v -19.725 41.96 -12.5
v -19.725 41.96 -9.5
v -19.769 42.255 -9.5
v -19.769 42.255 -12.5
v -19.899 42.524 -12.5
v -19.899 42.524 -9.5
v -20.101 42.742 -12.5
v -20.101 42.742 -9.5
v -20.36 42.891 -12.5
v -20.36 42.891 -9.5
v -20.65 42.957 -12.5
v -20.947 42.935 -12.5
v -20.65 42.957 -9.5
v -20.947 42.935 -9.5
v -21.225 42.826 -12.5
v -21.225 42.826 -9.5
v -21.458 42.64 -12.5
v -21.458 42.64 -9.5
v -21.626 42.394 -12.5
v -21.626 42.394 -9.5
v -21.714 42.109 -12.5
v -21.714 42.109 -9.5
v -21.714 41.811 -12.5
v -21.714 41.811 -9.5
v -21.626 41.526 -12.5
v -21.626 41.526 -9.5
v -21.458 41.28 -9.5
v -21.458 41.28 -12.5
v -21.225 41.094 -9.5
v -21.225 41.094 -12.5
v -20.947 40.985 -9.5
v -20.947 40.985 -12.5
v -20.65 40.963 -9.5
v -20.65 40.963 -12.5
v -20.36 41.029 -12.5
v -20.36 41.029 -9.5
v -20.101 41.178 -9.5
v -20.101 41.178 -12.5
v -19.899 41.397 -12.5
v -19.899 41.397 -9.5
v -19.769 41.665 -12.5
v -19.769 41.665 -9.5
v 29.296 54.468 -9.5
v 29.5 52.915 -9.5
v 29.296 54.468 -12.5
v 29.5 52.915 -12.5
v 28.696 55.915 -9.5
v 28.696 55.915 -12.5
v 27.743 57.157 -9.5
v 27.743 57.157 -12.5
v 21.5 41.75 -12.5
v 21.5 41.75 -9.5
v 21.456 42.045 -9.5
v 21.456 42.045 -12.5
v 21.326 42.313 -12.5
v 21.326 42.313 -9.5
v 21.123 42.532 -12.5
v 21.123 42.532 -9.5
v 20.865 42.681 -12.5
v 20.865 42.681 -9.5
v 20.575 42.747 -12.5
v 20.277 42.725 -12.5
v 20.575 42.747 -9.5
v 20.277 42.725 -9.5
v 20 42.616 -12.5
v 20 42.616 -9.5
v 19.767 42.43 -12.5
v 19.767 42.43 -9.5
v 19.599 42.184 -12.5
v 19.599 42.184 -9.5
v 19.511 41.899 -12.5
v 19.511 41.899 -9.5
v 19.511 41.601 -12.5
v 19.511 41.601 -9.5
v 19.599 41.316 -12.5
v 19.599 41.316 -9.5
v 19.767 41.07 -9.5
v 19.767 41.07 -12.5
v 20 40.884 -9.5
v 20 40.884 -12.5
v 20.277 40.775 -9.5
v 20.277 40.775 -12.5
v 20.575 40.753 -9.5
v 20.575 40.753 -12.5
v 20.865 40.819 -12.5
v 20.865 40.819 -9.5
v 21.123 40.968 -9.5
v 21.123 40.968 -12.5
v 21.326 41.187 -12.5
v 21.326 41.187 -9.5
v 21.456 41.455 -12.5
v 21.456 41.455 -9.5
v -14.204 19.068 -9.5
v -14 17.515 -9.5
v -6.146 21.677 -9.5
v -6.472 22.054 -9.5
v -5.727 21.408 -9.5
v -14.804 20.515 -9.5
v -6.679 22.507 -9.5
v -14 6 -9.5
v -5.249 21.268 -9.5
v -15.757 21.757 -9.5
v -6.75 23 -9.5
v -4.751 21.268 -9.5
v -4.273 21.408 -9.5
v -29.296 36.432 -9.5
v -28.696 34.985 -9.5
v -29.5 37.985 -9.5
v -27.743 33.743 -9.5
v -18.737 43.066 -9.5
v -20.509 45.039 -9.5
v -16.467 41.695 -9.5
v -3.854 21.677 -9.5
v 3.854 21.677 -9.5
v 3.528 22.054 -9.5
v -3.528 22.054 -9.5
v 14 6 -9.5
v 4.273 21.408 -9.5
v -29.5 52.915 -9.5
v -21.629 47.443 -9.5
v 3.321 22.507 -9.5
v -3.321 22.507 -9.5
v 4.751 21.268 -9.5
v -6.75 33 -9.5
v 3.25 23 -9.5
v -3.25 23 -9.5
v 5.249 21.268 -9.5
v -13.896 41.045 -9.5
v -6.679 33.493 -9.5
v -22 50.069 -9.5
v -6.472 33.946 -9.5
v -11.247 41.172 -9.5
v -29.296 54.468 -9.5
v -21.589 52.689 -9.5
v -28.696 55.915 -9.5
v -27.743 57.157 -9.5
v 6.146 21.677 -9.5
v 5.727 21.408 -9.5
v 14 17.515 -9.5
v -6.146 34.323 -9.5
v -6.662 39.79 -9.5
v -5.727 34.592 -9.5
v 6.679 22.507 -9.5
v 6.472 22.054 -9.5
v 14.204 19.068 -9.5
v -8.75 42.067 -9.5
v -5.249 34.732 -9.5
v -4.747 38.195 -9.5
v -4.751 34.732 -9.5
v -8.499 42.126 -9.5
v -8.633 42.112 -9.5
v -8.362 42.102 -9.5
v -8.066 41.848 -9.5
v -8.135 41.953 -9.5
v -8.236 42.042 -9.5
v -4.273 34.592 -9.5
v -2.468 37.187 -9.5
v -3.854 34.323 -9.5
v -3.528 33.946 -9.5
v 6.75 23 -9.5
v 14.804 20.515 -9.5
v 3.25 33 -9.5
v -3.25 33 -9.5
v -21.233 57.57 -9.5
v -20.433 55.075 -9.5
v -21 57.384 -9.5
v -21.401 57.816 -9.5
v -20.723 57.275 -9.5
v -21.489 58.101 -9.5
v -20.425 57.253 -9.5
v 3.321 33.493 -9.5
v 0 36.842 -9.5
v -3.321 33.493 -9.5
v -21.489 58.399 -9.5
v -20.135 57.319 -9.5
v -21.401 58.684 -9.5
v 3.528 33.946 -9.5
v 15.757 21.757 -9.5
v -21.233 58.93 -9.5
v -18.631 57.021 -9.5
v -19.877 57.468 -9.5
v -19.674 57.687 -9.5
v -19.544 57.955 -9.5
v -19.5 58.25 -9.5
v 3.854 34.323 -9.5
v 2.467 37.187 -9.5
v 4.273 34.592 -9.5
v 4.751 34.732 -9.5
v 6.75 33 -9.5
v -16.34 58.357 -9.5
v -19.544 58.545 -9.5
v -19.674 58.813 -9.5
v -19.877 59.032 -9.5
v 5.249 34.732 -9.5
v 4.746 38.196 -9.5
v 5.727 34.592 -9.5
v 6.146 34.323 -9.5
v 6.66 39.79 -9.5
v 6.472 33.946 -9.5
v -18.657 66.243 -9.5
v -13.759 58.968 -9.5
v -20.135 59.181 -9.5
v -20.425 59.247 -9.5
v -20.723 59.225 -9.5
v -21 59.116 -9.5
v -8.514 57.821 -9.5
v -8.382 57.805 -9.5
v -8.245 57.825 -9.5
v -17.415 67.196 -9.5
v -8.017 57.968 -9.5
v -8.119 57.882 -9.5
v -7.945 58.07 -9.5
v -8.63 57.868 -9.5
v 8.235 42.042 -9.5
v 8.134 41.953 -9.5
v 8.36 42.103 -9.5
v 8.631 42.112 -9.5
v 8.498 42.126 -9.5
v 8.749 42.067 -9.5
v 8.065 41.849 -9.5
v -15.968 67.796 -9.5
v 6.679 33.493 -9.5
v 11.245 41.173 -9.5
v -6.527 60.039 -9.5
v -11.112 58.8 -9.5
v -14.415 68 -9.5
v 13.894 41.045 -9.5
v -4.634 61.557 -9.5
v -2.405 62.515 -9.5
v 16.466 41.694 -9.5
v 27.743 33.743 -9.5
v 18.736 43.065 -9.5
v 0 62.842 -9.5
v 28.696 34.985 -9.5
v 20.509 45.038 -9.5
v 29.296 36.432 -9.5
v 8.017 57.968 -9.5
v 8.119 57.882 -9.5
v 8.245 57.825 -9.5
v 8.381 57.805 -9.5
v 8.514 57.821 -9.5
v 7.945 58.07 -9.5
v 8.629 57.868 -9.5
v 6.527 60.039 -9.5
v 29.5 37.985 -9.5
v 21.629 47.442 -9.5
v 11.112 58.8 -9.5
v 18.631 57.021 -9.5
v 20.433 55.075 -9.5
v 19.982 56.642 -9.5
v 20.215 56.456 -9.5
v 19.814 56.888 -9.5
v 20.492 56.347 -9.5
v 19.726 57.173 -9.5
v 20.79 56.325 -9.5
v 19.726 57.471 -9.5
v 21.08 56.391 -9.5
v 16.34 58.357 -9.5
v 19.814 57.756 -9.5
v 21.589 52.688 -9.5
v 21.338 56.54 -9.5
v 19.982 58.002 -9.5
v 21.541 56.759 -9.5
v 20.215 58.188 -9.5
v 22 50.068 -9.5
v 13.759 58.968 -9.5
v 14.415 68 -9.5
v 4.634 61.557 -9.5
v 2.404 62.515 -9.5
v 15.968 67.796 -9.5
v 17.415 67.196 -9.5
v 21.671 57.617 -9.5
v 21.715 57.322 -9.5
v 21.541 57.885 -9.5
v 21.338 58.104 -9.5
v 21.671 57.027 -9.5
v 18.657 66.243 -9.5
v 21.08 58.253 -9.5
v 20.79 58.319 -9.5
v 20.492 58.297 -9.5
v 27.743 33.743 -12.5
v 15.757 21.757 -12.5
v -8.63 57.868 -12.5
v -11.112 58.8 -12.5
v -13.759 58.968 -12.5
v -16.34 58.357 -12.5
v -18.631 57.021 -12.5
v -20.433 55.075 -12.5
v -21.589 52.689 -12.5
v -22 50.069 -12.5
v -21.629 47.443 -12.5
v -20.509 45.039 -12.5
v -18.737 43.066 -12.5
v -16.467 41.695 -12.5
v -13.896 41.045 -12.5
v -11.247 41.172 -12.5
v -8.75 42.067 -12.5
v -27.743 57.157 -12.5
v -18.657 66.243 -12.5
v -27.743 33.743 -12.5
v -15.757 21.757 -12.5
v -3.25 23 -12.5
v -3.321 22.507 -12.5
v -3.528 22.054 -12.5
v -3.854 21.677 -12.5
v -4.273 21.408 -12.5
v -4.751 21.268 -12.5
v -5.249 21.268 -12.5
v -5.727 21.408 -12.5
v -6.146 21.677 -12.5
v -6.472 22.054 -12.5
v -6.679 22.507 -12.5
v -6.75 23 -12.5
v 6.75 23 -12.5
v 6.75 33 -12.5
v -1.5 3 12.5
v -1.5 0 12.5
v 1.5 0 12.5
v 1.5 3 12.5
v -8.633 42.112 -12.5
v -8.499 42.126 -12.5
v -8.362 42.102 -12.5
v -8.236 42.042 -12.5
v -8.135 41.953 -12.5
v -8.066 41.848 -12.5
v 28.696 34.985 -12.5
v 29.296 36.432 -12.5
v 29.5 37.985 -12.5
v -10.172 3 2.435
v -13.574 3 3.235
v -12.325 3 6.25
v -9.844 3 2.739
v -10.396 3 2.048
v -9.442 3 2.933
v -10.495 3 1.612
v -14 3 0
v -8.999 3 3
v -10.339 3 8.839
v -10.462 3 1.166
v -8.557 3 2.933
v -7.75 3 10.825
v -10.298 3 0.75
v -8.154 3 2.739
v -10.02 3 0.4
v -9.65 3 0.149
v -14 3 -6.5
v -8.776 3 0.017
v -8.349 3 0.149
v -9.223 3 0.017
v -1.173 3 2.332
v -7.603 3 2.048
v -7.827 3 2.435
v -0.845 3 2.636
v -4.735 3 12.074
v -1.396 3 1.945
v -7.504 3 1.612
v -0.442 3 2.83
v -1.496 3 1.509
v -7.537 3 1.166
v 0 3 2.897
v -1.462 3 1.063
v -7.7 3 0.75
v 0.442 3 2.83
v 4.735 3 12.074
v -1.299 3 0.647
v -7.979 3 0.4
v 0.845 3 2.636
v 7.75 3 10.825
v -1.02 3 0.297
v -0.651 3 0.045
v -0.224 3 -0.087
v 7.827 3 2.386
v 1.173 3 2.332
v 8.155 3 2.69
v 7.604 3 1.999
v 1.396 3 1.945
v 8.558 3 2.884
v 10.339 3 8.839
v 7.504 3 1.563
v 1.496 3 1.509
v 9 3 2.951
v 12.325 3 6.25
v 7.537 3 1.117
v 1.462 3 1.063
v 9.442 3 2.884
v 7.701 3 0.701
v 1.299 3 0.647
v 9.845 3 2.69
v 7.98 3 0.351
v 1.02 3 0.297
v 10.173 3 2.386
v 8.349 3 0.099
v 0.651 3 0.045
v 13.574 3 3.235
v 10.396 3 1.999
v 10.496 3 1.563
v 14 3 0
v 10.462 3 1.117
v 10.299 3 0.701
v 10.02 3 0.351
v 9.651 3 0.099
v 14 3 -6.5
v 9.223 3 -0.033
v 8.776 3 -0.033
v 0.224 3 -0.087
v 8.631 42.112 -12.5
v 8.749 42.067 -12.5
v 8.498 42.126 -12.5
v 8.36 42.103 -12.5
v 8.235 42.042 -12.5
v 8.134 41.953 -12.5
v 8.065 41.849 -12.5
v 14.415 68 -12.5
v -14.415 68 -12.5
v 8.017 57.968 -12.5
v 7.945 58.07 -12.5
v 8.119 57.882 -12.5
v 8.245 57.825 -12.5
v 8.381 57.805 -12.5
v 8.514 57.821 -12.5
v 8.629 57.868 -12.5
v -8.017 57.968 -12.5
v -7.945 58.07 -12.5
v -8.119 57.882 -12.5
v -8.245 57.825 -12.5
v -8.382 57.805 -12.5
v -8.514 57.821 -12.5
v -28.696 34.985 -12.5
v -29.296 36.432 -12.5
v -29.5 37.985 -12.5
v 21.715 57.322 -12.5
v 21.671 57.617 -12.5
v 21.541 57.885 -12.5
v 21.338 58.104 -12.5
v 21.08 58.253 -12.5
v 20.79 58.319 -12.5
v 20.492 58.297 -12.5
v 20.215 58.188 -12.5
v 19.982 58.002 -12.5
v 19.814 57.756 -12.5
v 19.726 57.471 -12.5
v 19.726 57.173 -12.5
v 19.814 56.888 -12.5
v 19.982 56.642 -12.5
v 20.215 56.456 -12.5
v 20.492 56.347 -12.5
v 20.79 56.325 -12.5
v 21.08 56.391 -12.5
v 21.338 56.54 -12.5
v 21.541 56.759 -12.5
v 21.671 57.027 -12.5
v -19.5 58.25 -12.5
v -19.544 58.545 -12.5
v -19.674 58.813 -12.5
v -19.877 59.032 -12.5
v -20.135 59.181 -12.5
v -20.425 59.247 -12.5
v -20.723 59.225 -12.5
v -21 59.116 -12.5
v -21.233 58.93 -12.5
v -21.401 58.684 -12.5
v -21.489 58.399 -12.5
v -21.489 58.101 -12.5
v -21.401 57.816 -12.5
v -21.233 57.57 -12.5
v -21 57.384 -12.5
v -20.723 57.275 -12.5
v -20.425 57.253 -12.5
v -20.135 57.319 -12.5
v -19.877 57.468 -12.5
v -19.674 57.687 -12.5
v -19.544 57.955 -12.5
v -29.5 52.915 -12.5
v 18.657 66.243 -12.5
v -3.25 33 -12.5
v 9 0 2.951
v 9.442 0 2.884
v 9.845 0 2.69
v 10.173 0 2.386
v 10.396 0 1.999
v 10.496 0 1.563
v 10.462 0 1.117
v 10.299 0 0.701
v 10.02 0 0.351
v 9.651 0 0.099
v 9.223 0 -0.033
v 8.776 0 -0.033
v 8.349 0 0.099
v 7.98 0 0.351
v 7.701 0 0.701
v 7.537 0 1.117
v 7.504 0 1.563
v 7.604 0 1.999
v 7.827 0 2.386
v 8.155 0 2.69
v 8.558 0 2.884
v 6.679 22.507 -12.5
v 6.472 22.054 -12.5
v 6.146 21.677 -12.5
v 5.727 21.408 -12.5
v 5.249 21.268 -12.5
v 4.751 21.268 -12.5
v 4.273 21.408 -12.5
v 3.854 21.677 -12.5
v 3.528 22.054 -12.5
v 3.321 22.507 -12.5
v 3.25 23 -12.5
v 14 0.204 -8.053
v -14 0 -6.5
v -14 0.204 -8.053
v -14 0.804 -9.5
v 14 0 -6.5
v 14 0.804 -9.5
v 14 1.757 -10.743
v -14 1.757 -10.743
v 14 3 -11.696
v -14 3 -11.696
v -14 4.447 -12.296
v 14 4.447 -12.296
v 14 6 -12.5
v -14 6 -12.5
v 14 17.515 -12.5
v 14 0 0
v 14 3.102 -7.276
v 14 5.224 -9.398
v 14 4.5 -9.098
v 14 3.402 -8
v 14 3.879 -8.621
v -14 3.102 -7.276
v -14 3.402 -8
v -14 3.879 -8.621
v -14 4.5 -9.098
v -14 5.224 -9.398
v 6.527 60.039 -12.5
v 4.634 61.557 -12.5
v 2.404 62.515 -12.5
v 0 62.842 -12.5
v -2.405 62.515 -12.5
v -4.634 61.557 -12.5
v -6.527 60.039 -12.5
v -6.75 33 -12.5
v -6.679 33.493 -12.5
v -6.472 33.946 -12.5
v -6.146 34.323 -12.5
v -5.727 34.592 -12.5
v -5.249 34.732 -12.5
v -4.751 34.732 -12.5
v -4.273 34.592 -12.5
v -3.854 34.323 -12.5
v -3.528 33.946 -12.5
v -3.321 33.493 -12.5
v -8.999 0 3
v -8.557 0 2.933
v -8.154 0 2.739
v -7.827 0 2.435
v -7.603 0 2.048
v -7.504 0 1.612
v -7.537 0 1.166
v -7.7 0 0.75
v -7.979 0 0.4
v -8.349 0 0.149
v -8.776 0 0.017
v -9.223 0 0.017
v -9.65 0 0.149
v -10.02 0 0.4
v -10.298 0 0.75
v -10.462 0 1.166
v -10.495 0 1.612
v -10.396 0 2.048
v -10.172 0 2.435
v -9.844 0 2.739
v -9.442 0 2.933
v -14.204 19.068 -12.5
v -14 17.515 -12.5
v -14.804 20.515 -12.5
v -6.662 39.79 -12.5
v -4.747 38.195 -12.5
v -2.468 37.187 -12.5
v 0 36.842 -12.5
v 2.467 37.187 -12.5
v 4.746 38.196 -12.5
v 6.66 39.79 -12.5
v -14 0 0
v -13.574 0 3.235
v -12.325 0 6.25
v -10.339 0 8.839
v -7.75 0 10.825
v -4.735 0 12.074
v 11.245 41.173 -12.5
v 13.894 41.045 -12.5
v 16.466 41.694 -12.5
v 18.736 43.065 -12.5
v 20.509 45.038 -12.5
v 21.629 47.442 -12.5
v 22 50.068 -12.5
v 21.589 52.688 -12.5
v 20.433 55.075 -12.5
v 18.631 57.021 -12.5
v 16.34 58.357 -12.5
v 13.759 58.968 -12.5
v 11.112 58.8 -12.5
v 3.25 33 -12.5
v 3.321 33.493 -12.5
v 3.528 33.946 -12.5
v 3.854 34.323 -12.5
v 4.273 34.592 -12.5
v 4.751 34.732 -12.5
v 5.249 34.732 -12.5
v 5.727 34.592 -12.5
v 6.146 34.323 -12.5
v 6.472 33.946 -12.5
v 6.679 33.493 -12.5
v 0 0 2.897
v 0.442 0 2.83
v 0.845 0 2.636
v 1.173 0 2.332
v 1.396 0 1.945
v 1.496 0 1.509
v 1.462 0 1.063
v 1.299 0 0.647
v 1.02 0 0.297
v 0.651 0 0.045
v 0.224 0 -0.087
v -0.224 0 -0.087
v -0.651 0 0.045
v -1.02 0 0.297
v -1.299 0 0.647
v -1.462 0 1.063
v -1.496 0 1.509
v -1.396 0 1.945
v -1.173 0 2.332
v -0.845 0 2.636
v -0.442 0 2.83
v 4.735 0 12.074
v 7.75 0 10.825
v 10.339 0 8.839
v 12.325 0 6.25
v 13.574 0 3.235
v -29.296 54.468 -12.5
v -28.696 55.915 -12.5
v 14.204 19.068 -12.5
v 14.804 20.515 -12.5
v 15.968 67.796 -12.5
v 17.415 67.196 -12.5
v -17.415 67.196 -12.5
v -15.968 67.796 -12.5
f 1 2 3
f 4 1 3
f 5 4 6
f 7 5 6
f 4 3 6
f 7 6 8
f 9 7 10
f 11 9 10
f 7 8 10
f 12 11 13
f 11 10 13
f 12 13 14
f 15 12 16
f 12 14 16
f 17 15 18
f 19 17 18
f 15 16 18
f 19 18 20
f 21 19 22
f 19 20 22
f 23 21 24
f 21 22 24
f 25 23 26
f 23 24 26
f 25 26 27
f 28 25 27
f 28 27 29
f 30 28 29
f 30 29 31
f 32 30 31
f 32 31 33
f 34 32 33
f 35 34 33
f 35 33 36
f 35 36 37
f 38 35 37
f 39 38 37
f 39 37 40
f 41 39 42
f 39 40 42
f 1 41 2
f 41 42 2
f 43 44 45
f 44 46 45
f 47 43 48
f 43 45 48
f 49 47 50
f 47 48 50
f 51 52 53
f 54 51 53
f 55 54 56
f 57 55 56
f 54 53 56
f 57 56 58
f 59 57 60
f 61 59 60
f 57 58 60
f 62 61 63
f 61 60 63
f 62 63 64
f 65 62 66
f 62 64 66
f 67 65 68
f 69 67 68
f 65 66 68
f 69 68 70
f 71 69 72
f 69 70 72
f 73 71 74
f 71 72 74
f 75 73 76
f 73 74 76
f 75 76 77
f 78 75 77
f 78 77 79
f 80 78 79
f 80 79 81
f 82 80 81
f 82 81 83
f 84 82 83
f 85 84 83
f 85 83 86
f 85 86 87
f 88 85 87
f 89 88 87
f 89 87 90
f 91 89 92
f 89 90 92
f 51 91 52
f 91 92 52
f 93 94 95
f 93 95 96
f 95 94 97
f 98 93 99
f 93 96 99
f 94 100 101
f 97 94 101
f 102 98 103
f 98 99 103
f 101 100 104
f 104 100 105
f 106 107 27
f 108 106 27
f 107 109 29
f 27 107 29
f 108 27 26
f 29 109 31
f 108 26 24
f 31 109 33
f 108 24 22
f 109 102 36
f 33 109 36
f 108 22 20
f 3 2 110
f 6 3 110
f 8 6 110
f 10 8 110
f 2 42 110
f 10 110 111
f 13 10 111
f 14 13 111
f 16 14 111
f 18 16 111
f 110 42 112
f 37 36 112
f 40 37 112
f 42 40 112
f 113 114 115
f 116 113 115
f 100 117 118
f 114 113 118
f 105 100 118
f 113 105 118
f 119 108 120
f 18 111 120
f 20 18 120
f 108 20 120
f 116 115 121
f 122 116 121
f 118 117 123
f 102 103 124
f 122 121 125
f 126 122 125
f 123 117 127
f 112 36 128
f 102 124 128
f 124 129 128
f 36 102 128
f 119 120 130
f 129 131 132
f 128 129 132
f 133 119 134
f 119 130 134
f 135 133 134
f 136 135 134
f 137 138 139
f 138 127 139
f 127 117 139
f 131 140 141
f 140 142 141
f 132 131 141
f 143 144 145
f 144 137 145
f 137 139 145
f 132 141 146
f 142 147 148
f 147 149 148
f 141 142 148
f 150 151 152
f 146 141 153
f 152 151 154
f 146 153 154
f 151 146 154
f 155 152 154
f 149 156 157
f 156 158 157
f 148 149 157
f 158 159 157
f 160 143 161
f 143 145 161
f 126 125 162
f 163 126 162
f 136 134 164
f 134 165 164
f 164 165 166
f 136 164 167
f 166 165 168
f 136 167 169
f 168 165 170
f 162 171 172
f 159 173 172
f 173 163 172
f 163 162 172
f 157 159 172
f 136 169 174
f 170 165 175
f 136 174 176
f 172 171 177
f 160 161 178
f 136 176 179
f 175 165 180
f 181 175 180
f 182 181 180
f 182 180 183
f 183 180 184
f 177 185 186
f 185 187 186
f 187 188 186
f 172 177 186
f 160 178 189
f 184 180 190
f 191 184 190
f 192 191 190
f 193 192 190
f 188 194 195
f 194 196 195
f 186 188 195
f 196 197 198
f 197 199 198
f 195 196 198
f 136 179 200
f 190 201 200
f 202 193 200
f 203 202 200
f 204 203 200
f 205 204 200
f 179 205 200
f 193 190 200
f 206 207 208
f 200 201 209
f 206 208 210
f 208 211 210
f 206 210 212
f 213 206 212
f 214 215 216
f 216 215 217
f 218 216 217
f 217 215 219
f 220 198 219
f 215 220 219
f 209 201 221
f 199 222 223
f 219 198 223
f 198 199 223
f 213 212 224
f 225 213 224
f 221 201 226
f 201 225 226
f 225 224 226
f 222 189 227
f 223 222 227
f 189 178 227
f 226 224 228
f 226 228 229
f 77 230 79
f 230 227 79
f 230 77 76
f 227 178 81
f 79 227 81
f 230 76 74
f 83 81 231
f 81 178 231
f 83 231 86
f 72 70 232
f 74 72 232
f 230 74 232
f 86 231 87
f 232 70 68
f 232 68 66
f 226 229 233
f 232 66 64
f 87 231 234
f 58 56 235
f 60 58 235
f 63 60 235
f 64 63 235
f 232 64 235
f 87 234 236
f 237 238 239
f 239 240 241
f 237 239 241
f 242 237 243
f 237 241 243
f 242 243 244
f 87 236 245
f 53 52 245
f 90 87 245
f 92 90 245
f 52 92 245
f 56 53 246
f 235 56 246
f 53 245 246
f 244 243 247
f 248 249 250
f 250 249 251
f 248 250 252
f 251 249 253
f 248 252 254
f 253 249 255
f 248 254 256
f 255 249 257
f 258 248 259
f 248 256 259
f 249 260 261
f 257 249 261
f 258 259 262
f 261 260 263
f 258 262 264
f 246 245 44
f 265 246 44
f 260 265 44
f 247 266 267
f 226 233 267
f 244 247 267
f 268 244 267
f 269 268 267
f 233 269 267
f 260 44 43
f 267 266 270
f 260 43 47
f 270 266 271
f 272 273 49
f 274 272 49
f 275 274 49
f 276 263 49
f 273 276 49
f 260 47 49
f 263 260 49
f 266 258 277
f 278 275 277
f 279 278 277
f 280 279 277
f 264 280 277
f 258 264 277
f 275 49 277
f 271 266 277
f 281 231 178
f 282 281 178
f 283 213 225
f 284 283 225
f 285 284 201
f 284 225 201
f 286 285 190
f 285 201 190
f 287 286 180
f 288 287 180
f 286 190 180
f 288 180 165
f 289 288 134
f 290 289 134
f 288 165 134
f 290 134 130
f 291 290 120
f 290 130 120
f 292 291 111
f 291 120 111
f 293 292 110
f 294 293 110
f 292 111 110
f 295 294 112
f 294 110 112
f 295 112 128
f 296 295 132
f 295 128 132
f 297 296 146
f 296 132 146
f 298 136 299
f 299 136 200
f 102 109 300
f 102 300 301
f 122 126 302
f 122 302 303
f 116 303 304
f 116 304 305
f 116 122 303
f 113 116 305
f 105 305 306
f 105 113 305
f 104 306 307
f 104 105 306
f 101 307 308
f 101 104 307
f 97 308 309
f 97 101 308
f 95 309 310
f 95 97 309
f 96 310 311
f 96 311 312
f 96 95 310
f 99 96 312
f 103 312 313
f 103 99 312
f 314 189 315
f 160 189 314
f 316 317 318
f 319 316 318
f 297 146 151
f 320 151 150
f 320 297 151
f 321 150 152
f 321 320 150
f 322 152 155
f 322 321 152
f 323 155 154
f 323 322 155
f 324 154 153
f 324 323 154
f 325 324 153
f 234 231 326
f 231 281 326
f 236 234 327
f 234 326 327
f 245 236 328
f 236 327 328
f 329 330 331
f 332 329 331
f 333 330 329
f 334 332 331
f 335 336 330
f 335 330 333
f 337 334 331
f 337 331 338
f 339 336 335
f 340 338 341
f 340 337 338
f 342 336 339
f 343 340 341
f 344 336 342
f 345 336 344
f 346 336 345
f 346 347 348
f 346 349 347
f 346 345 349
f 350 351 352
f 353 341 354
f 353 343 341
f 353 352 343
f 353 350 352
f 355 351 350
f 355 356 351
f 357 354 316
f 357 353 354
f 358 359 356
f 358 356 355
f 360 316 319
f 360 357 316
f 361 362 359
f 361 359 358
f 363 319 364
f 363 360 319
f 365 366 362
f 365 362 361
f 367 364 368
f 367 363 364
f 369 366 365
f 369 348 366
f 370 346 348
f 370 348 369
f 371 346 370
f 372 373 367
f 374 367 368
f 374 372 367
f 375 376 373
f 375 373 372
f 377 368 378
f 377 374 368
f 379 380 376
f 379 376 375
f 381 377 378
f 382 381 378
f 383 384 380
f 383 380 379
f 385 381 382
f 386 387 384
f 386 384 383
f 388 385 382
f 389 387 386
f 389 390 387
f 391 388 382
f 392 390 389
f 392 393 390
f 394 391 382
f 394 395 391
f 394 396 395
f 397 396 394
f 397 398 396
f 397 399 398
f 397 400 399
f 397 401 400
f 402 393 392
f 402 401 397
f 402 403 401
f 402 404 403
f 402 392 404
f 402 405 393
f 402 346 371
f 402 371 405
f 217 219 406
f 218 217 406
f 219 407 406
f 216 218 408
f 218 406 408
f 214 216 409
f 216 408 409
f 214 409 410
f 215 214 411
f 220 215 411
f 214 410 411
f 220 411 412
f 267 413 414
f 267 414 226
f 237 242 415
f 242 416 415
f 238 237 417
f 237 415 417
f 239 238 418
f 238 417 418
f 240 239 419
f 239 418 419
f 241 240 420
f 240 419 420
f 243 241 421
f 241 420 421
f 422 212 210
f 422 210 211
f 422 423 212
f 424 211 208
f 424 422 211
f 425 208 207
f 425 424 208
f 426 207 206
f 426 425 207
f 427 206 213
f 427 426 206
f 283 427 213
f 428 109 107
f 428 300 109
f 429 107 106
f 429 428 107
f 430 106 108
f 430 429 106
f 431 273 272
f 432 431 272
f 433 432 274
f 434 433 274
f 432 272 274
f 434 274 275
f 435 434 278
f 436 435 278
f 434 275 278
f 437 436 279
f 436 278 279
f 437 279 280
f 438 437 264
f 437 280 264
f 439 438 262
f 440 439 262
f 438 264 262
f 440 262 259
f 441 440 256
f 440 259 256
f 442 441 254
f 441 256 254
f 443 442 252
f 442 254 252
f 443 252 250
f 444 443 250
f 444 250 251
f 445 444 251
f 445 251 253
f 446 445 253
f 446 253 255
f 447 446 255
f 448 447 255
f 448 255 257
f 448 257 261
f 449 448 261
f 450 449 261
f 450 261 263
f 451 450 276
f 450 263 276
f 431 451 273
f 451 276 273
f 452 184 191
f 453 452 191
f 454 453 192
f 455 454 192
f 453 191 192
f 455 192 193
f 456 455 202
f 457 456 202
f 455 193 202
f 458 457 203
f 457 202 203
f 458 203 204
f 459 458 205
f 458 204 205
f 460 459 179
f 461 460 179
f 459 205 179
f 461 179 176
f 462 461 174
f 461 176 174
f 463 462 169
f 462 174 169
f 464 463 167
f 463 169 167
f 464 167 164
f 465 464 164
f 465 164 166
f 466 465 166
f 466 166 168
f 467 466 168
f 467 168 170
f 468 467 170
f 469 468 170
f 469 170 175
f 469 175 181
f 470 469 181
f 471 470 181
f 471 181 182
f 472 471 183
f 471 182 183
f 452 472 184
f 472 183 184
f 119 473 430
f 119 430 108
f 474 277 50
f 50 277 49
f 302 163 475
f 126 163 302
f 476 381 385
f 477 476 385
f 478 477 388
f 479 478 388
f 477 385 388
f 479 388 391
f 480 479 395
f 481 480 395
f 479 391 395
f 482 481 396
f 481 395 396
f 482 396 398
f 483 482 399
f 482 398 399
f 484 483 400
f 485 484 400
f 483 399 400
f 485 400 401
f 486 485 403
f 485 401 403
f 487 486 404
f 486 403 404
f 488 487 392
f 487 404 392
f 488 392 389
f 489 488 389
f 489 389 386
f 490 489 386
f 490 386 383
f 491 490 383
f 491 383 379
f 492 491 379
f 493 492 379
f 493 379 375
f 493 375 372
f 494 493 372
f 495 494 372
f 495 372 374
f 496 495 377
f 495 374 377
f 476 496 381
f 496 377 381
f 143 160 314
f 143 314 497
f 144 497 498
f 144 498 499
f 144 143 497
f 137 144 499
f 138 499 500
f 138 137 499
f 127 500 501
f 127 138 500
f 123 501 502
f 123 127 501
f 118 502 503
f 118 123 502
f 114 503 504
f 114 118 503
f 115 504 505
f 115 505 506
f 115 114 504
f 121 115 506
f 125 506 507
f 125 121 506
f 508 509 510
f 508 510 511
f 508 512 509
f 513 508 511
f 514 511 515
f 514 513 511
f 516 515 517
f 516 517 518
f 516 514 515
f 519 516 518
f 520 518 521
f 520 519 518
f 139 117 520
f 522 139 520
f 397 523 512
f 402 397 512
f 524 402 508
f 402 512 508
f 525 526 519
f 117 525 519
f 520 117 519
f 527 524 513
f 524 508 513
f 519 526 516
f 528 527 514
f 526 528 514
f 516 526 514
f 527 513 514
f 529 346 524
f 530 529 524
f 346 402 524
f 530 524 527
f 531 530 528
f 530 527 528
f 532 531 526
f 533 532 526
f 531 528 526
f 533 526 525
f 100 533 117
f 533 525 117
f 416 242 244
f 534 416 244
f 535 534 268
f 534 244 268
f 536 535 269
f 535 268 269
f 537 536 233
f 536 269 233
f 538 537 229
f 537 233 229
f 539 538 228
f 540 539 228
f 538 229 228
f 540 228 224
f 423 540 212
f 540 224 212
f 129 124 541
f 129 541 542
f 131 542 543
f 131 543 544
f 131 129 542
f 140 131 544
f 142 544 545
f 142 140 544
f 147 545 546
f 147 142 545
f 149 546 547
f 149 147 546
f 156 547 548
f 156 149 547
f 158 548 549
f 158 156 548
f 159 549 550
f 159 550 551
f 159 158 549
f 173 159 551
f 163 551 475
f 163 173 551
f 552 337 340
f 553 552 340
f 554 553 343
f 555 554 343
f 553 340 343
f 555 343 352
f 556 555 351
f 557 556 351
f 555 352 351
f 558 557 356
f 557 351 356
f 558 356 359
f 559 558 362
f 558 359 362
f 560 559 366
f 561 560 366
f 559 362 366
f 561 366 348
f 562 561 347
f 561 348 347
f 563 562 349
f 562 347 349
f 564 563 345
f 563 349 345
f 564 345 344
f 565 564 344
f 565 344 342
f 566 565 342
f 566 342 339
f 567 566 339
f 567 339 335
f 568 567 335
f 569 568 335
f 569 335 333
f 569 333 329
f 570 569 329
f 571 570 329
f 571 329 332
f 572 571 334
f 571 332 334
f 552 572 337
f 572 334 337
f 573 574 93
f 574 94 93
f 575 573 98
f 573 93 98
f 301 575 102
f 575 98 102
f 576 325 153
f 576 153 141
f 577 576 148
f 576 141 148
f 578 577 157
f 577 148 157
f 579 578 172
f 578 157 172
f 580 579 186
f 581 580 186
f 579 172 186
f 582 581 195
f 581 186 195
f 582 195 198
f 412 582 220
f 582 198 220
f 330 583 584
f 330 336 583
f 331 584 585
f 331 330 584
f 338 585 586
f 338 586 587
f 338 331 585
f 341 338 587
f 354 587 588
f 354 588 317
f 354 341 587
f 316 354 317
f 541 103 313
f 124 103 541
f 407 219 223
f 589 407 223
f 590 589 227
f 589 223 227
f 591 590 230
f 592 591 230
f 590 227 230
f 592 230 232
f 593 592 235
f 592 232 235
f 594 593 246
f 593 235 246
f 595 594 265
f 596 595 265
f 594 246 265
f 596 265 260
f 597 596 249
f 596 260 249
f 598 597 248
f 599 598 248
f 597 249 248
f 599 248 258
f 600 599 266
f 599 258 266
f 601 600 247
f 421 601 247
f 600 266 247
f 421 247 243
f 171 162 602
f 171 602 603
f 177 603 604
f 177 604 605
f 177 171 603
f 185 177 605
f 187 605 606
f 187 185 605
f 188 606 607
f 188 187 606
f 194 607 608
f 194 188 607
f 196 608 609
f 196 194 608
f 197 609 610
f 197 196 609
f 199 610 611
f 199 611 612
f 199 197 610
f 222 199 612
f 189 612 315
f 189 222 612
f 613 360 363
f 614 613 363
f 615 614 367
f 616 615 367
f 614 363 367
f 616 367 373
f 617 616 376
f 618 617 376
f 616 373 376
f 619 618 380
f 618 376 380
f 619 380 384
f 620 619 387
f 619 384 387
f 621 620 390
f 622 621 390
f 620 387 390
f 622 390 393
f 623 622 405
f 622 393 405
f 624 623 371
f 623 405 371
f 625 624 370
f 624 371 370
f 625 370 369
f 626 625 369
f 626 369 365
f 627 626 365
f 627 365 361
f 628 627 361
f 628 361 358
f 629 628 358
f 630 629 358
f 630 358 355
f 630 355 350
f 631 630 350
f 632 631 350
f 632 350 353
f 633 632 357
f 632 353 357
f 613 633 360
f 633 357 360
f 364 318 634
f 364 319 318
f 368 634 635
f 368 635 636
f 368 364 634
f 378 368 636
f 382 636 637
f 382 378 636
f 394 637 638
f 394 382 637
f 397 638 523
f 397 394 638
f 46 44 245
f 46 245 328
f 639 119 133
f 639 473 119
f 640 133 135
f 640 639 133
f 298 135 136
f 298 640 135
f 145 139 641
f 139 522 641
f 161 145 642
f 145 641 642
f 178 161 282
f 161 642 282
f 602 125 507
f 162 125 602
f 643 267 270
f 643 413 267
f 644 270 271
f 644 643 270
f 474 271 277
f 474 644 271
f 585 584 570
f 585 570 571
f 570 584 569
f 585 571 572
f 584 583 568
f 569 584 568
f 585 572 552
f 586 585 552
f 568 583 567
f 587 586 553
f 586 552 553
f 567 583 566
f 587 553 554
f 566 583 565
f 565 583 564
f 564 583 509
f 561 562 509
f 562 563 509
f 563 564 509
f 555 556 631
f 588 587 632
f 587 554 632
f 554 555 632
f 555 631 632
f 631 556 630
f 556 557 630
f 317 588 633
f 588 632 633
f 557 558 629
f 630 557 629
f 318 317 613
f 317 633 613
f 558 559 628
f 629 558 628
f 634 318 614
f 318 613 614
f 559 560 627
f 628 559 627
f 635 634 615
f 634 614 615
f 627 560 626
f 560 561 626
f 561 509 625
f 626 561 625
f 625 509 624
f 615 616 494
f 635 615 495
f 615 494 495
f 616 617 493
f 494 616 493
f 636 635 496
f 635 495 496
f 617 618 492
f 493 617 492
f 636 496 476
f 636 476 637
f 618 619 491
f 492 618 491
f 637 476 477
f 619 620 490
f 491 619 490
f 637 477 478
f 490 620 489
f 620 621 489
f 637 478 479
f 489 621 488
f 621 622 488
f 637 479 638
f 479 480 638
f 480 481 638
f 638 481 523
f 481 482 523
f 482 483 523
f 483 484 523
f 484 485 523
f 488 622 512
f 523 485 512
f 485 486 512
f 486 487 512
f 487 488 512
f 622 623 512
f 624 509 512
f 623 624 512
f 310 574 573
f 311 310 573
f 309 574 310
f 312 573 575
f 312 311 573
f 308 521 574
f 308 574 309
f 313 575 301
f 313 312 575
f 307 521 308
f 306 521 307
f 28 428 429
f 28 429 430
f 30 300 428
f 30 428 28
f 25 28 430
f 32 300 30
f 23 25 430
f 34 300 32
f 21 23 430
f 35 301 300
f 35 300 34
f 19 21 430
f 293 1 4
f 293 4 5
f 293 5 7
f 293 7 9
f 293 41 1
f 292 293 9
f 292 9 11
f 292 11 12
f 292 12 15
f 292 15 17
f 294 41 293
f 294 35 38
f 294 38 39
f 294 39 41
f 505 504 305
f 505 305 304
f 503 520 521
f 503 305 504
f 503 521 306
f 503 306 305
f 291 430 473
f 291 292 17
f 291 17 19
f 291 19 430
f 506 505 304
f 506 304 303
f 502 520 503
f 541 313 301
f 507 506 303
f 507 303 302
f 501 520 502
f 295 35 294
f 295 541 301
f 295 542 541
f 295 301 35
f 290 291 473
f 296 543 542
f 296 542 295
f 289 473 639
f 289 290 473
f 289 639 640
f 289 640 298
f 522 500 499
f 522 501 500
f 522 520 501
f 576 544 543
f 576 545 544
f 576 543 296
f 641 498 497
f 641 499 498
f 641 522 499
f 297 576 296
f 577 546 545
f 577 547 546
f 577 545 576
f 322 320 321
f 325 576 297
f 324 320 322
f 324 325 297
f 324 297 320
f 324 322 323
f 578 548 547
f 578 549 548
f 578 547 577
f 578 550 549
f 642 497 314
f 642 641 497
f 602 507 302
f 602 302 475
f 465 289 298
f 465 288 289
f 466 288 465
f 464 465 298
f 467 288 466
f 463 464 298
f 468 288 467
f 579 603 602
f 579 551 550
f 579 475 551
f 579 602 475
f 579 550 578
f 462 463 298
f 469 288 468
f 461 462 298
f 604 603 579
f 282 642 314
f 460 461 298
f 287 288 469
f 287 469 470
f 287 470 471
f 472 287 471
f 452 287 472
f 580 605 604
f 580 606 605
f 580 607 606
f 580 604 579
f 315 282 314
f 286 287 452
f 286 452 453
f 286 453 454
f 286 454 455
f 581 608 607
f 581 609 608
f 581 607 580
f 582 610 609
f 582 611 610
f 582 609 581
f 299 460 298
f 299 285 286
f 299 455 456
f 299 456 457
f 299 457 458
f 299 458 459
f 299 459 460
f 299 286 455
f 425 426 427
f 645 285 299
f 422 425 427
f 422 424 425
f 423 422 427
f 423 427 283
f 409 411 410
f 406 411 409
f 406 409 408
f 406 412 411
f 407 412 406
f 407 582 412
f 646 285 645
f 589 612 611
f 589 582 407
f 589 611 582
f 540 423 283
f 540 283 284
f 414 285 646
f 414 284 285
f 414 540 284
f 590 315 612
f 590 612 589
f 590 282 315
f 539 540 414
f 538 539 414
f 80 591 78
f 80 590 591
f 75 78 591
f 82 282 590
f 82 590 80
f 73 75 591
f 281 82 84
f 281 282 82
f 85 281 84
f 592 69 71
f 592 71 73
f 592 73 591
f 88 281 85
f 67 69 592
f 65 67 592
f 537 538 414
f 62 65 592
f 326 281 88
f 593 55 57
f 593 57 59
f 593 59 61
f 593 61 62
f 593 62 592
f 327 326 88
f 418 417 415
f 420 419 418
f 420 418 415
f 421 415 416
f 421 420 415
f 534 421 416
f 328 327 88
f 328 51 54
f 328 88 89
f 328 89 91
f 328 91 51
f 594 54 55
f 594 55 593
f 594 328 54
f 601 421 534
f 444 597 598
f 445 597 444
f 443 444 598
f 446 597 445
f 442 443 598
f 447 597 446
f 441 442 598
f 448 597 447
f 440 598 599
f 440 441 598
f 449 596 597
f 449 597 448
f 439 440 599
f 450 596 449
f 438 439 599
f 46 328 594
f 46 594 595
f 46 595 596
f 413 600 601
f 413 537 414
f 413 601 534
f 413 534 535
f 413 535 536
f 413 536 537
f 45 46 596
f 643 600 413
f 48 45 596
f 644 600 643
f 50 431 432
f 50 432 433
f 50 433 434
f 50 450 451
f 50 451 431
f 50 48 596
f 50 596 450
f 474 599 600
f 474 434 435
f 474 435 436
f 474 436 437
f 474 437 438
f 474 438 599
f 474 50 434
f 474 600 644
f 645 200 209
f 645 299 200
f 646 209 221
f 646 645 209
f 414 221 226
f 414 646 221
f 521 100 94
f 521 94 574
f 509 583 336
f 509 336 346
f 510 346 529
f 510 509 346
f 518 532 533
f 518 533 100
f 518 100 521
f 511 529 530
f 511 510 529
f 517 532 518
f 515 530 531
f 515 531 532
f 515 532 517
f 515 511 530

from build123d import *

# Parameters (mm, degrees)
SKETCH1_W           = 28
SKETCH1_H           = 25
BOSS_EXTRUDE1_DEPTH = 3
FILLET1_R           = 12.5
SKETCH2_W           = 28
SKETCH2_H           = 3
BOSS_EXTRUDE2_DEPTH = 65
SKETCH3_W           = 3
SKETCH3_H           = 48
BOSS_EXTRUDE3_DEPTH = 15.5
SKETCH4_W           = 3
SKETCH4_H           = 48
BOSS_EXTRUDE4_DEPTH = 15.5
SKETCH9_W           = 14.741294127
SKETCH9_H           = 6.665628648
CUT_EXTRUDE1_DEPTH  = 3
SKETCH6_R           = 9
CUT_EXTRUDE2_DEPTH  = 3
CUT_EXTRUDE4_DEPTH  = 3
CUT_EXTRUDE5_DEPTH  = 3
CUT_EXTRUDE8_DEPTH  = 3
FILLET3_R           = 3
FILLET4_R           = 6
FILLET5_R           = 6
FILLET6_R           = 6
FILLET7_R           = 0.5
SKETCH13_R          = 1.5
CUT_EXTRUDE10_DEPTH = 3
SKETCH14_R          = 1
CUT_EXTRUDE11_DEPTH = 3


with BuildPart() as part:
    # Sketch1 → Boss-Extrude1 (new body)
    with BuildSketch(Plane(origin=(0, 0, 0), x_dir=(1, 0, 0), z_dir=(0, 1, 0))):
        Rectangle(SKETCH1_W, SKETCH1_H)
    extrude(amount=BOSS_EXTRUDE1_DEPTH)

    # Fillet1
    fillet1_edges = [part.edges().sort_by_distance(p)[0] for p in [
        (14, 1.5, 12.5),
        (-14, 1.5, 12.5),
    ]]
    fillet(fillet1_edges, radius=FILLET1_R)

    # Sketch2 → Boss-Extrude2 (add)
    with BuildSketch(Plane(origin=(0, 3, 0), x_dir=(1, 0, 0), z_dir=(0, 1, 0))):
        with Locations((0, 11)):
            Rectangle(SKETCH2_W, SKETCH2_H)
    extrude(amount=BOSS_EXTRUDE2_DEPTH)

    # Sketch3 → Boss-Extrude3 (add)
    with BuildSketch(Plane(origin=(14, 0, 0), x_dir=(0, 0, -1), z_dir=(1, 0, 0))):
        with Locations((11, 44)):
            Rectangle(SKETCH3_W, SKETCH3_H)
    extrude(amount=BOSS_EXTRUDE3_DEPTH)

    # Sketch4 → Boss-Extrude4 (add)
    with BuildSketch(Plane.ZY.offset(14)):
        with Locations((-11, 44)):
            Rectangle(SKETCH4_W, SKETCH4_H)
    extrude(amount=BOSS_EXTRUDE4_DEPTH)

    # Sketch9 → Cut-Extrude1 (cut)
    with BuildSketch(Plane.XY.offset(-9.5)):
        with Locations((0.406189009, 49.915136893)):
            Rectangle(SKETCH9_W, SKETCH9_H)
    extrude(amount=-CUT_EXTRUDE1_DEPTH, mode=Mode.SUBTRACT)

    # Sketch6 → Cut-Extrude2 (cut)
    with BuildSketch(Plane.XY.offset(-9.5)):
        with Locations((-13, 50)):
            Circle(SKETCH6_R)
        with Locations((13, 50)):
            Circle(SKETCH6_R)
    extrude(amount=-CUT_EXTRUDE2_DEPTH, mode=Mode.SUBTRACT)

    # Sketch10 → Cut-Extrude4 (cut)
    with BuildSketch(Plane.XY.offset(-9.5)):
        with BuildLine():
            ThreePointArc((4.712414346, 53.509405082), (6.133712339, 55.818427086), (8.178203975, 57.599360703))
            ThreePointArc((8.178203975, 57.599360703), (-3.213e-05, 62.842256013), (-8.178312295, 57.599429431))
            ThreePointArc((-8.178312295, 57.599429431), (-6.134043572, 55.818817949), (-4.71276392, 53.5102305))
            ThreePointArc((-4.71276392, 53.5102305), (-5.8098e-05, 54.842256016), (4.712414346, 53.509405082))
        make_face()
        with BuildLine():
            ThreePointArc((-8.28808236, 42.332025551), (-0.000398085, 36.842256062), (8.286739374, 42.332850969))
            ThreePointArc((8.286739374, 42.332850969), (6.264272315, 44.030915266), (4.821726078, 46.24289531))
            ThreePointArc((4.821726078, 46.24289531), (-5.805e-06, 44.842256013), (-4.821757652, 46.242826582))
            ThreePointArc((-4.821757652, 46.242826582), (-6.264820173, 44.030297102), (-8.28808236, 42.332025551))
        make_face()
        with BuildLine():
            ThreePointArc((-4.821757652, 46.242826582), (-5.805e-06, 44.842256013), (4.821726078, 46.24289531))
            ThreePointArc((4.821726078, 46.24289531), (4.746201964, 46.41185034), (4.674167851, 46.582322569))
            Line((4.674167851, 46.582322569), (-4.674167851, 46.582322569))
            ThreePointArc((-4.674167851, 46.582322569), (-4.746217041, 46.411815659), (-4.821757652, 46.242826582))
        make_face()
        with BuildLine():
            ThreePointArc((4.606501749, 53.247951217), (4.658433625, 53.379093134), (4.712414346, 53.509405082))
            ThreePointArc((4.712414346, 53.509405082), (-5.8098e-05, 54.842256016), (-4.71276392, 53.5102305))
            ThreePointArc((-4.71276392, 53.5102305), (-4.658601912, 53.379508536), (-4.606501749, 53.247951217))
            Line((-4.606501749, 53.247951217), (4.606501749, 53.247951217))
        make_face()
    extrude(amount=-CUT_EXTRUDE4_DEPTH, mode=Mode.SUBTRACT)

    # Sketch11 → Cut-Extrude5 (cut)
    with BuildSketch(Plane.XY.offset(-9.5)):
        Polygon((-29.5, 55.4), (-16.9, 68), (-29.5, 68), align=None)
        Polygon((29.5, 55.4), (29.5, 68), (16.9, 68), align=None)
        Polygon((14, 20), (29.5, 20), (29.5, 35.5), align=None)
        Polygon((-14, 20), (-29.5, 20), (-29.5, 35.5), align=None)
    extrude(amount=-CUT_EXTRUDE5_DEPTH, mode=Mode.SUBTRACT)

    # Sketch12 → Cut-Extrude8 (cut)
    with BuildSketch(Plane.XY.offset(-9.5)):
        with BuildLine():
            Line((-3.25, 33), (-3.25, 23))
            ThreePointArc((-3.25, 23), (-5, 21.25), (-6.75, 23))
            Line((-6.75, 23), (-6.75, 33))
            ThreePointArc((-6.75, 33), (-5, 34.75), (-3.25, 33))
        make_face()
        with BuildLine():
            Line((6.75, 33), (6.75, 23))
            ThreePointArc((6.75, 23), (5, 21.25), (3.25, 23))
            Line((3.25, 23), (3.25, 33))
            ThreePointArc((3.25, 33), (5, 34.75), (6.75, 33))
        make_face()
    extrude(amount=-CUT_EXTRUDE8_DEPTH, mode=Mode.SUBTRACT)

    # Fillet3
    fillet3_edges = [part.edges().sort_by_distance(p)[0] for p in [
        (0, 3, -9.5),
    ]]
    fillet(fillet3_edges, radius=FILLET3_R)

    # Fillet4
    fillet4_edges = [part.edges().sort_by_distance(p)[0] for p in [
        (0, 0, -12.5),
    ]]
    fillet(fillet4_edges, radius=FILLET4_R)

    # Fillet5
    fillet5_edges = [part.edges().sort_by_distance(p)[0] for p in [
        (-14, 20, -11),
        (14, 20, -11),
    ]]
    fillet(fillet5_edges, radius=FILLET5_R)

    # Fillet6
    fillet6_edges = [part.edges().sort_by_distance(p)[0] for p in [
        (-29.5, 55.4, -11),
        (-16.9, 68, -11),
        (29.5, 55.4, -11),
        (16.9, 68, -11),
        (29.5, 35.5, -11),
        (-29.5, 35.5, -11),
    ]]
    fillet(fillet6_edges, radius=FILLET6_R)

    # Fillet7
    fillet7_edges = [part.edges().sort_by_distance(p)[0] for p in [
        (-8.28808236, 42.332025551, -11),
        (8.286739374, 42.332850969, -11),
        (-8.178312295, 57.599429431, -11),
        (8.178203975, 57.599360703, -11),
    ]]
    fillet(fillet7_edges, radius=FILLET7_R)

    # Sketch13 → Cut-Extrude10 (cut)
    with BuildSketch(Plane(origin=(0, 3, 0), x_dir=(1, 0, 0), z_dir=(0, 1, 0))):
        with Locations(Location((0, -1.396515007, 0), (0, 0, 270))):
            Circle(SKETCH13_R)
        with Locations(Location((8.999836974, -1.450685505, 0), (0, 0, 270))):
            Circle(SKETCH13_R)
        with Locations(Location((-8.999405212, -1.499984009, 0), (0, 0, 270))):
            Circle(SKETCH13_R)
    extrude(amount=-CUT_EXTRUDE10_DEPTH, mode=Mode.SUBTRACT)

    # Sketch14 → Cut-Extrude11 (cut)
    with BuildSketch(Plane.XY.offset(-9.5)):
        with Locations((-20.5, 58.25)):
            Circle(SKETCH14_R)
        with Locations((-20.724916228, 41.960213357)):
            Circle(SKETCH14_R)
        with Locations((20.5, 41.75)):
            Circle(SKETCH14_R)
        with Locations((20.715004912, 57.321949454)):
            Circle(SKETCH14_R)
    extrude(amount=-CUT_EXTRUDE11_DEPTH, mode=Mode.SUBTRACT)


solid = part.part
